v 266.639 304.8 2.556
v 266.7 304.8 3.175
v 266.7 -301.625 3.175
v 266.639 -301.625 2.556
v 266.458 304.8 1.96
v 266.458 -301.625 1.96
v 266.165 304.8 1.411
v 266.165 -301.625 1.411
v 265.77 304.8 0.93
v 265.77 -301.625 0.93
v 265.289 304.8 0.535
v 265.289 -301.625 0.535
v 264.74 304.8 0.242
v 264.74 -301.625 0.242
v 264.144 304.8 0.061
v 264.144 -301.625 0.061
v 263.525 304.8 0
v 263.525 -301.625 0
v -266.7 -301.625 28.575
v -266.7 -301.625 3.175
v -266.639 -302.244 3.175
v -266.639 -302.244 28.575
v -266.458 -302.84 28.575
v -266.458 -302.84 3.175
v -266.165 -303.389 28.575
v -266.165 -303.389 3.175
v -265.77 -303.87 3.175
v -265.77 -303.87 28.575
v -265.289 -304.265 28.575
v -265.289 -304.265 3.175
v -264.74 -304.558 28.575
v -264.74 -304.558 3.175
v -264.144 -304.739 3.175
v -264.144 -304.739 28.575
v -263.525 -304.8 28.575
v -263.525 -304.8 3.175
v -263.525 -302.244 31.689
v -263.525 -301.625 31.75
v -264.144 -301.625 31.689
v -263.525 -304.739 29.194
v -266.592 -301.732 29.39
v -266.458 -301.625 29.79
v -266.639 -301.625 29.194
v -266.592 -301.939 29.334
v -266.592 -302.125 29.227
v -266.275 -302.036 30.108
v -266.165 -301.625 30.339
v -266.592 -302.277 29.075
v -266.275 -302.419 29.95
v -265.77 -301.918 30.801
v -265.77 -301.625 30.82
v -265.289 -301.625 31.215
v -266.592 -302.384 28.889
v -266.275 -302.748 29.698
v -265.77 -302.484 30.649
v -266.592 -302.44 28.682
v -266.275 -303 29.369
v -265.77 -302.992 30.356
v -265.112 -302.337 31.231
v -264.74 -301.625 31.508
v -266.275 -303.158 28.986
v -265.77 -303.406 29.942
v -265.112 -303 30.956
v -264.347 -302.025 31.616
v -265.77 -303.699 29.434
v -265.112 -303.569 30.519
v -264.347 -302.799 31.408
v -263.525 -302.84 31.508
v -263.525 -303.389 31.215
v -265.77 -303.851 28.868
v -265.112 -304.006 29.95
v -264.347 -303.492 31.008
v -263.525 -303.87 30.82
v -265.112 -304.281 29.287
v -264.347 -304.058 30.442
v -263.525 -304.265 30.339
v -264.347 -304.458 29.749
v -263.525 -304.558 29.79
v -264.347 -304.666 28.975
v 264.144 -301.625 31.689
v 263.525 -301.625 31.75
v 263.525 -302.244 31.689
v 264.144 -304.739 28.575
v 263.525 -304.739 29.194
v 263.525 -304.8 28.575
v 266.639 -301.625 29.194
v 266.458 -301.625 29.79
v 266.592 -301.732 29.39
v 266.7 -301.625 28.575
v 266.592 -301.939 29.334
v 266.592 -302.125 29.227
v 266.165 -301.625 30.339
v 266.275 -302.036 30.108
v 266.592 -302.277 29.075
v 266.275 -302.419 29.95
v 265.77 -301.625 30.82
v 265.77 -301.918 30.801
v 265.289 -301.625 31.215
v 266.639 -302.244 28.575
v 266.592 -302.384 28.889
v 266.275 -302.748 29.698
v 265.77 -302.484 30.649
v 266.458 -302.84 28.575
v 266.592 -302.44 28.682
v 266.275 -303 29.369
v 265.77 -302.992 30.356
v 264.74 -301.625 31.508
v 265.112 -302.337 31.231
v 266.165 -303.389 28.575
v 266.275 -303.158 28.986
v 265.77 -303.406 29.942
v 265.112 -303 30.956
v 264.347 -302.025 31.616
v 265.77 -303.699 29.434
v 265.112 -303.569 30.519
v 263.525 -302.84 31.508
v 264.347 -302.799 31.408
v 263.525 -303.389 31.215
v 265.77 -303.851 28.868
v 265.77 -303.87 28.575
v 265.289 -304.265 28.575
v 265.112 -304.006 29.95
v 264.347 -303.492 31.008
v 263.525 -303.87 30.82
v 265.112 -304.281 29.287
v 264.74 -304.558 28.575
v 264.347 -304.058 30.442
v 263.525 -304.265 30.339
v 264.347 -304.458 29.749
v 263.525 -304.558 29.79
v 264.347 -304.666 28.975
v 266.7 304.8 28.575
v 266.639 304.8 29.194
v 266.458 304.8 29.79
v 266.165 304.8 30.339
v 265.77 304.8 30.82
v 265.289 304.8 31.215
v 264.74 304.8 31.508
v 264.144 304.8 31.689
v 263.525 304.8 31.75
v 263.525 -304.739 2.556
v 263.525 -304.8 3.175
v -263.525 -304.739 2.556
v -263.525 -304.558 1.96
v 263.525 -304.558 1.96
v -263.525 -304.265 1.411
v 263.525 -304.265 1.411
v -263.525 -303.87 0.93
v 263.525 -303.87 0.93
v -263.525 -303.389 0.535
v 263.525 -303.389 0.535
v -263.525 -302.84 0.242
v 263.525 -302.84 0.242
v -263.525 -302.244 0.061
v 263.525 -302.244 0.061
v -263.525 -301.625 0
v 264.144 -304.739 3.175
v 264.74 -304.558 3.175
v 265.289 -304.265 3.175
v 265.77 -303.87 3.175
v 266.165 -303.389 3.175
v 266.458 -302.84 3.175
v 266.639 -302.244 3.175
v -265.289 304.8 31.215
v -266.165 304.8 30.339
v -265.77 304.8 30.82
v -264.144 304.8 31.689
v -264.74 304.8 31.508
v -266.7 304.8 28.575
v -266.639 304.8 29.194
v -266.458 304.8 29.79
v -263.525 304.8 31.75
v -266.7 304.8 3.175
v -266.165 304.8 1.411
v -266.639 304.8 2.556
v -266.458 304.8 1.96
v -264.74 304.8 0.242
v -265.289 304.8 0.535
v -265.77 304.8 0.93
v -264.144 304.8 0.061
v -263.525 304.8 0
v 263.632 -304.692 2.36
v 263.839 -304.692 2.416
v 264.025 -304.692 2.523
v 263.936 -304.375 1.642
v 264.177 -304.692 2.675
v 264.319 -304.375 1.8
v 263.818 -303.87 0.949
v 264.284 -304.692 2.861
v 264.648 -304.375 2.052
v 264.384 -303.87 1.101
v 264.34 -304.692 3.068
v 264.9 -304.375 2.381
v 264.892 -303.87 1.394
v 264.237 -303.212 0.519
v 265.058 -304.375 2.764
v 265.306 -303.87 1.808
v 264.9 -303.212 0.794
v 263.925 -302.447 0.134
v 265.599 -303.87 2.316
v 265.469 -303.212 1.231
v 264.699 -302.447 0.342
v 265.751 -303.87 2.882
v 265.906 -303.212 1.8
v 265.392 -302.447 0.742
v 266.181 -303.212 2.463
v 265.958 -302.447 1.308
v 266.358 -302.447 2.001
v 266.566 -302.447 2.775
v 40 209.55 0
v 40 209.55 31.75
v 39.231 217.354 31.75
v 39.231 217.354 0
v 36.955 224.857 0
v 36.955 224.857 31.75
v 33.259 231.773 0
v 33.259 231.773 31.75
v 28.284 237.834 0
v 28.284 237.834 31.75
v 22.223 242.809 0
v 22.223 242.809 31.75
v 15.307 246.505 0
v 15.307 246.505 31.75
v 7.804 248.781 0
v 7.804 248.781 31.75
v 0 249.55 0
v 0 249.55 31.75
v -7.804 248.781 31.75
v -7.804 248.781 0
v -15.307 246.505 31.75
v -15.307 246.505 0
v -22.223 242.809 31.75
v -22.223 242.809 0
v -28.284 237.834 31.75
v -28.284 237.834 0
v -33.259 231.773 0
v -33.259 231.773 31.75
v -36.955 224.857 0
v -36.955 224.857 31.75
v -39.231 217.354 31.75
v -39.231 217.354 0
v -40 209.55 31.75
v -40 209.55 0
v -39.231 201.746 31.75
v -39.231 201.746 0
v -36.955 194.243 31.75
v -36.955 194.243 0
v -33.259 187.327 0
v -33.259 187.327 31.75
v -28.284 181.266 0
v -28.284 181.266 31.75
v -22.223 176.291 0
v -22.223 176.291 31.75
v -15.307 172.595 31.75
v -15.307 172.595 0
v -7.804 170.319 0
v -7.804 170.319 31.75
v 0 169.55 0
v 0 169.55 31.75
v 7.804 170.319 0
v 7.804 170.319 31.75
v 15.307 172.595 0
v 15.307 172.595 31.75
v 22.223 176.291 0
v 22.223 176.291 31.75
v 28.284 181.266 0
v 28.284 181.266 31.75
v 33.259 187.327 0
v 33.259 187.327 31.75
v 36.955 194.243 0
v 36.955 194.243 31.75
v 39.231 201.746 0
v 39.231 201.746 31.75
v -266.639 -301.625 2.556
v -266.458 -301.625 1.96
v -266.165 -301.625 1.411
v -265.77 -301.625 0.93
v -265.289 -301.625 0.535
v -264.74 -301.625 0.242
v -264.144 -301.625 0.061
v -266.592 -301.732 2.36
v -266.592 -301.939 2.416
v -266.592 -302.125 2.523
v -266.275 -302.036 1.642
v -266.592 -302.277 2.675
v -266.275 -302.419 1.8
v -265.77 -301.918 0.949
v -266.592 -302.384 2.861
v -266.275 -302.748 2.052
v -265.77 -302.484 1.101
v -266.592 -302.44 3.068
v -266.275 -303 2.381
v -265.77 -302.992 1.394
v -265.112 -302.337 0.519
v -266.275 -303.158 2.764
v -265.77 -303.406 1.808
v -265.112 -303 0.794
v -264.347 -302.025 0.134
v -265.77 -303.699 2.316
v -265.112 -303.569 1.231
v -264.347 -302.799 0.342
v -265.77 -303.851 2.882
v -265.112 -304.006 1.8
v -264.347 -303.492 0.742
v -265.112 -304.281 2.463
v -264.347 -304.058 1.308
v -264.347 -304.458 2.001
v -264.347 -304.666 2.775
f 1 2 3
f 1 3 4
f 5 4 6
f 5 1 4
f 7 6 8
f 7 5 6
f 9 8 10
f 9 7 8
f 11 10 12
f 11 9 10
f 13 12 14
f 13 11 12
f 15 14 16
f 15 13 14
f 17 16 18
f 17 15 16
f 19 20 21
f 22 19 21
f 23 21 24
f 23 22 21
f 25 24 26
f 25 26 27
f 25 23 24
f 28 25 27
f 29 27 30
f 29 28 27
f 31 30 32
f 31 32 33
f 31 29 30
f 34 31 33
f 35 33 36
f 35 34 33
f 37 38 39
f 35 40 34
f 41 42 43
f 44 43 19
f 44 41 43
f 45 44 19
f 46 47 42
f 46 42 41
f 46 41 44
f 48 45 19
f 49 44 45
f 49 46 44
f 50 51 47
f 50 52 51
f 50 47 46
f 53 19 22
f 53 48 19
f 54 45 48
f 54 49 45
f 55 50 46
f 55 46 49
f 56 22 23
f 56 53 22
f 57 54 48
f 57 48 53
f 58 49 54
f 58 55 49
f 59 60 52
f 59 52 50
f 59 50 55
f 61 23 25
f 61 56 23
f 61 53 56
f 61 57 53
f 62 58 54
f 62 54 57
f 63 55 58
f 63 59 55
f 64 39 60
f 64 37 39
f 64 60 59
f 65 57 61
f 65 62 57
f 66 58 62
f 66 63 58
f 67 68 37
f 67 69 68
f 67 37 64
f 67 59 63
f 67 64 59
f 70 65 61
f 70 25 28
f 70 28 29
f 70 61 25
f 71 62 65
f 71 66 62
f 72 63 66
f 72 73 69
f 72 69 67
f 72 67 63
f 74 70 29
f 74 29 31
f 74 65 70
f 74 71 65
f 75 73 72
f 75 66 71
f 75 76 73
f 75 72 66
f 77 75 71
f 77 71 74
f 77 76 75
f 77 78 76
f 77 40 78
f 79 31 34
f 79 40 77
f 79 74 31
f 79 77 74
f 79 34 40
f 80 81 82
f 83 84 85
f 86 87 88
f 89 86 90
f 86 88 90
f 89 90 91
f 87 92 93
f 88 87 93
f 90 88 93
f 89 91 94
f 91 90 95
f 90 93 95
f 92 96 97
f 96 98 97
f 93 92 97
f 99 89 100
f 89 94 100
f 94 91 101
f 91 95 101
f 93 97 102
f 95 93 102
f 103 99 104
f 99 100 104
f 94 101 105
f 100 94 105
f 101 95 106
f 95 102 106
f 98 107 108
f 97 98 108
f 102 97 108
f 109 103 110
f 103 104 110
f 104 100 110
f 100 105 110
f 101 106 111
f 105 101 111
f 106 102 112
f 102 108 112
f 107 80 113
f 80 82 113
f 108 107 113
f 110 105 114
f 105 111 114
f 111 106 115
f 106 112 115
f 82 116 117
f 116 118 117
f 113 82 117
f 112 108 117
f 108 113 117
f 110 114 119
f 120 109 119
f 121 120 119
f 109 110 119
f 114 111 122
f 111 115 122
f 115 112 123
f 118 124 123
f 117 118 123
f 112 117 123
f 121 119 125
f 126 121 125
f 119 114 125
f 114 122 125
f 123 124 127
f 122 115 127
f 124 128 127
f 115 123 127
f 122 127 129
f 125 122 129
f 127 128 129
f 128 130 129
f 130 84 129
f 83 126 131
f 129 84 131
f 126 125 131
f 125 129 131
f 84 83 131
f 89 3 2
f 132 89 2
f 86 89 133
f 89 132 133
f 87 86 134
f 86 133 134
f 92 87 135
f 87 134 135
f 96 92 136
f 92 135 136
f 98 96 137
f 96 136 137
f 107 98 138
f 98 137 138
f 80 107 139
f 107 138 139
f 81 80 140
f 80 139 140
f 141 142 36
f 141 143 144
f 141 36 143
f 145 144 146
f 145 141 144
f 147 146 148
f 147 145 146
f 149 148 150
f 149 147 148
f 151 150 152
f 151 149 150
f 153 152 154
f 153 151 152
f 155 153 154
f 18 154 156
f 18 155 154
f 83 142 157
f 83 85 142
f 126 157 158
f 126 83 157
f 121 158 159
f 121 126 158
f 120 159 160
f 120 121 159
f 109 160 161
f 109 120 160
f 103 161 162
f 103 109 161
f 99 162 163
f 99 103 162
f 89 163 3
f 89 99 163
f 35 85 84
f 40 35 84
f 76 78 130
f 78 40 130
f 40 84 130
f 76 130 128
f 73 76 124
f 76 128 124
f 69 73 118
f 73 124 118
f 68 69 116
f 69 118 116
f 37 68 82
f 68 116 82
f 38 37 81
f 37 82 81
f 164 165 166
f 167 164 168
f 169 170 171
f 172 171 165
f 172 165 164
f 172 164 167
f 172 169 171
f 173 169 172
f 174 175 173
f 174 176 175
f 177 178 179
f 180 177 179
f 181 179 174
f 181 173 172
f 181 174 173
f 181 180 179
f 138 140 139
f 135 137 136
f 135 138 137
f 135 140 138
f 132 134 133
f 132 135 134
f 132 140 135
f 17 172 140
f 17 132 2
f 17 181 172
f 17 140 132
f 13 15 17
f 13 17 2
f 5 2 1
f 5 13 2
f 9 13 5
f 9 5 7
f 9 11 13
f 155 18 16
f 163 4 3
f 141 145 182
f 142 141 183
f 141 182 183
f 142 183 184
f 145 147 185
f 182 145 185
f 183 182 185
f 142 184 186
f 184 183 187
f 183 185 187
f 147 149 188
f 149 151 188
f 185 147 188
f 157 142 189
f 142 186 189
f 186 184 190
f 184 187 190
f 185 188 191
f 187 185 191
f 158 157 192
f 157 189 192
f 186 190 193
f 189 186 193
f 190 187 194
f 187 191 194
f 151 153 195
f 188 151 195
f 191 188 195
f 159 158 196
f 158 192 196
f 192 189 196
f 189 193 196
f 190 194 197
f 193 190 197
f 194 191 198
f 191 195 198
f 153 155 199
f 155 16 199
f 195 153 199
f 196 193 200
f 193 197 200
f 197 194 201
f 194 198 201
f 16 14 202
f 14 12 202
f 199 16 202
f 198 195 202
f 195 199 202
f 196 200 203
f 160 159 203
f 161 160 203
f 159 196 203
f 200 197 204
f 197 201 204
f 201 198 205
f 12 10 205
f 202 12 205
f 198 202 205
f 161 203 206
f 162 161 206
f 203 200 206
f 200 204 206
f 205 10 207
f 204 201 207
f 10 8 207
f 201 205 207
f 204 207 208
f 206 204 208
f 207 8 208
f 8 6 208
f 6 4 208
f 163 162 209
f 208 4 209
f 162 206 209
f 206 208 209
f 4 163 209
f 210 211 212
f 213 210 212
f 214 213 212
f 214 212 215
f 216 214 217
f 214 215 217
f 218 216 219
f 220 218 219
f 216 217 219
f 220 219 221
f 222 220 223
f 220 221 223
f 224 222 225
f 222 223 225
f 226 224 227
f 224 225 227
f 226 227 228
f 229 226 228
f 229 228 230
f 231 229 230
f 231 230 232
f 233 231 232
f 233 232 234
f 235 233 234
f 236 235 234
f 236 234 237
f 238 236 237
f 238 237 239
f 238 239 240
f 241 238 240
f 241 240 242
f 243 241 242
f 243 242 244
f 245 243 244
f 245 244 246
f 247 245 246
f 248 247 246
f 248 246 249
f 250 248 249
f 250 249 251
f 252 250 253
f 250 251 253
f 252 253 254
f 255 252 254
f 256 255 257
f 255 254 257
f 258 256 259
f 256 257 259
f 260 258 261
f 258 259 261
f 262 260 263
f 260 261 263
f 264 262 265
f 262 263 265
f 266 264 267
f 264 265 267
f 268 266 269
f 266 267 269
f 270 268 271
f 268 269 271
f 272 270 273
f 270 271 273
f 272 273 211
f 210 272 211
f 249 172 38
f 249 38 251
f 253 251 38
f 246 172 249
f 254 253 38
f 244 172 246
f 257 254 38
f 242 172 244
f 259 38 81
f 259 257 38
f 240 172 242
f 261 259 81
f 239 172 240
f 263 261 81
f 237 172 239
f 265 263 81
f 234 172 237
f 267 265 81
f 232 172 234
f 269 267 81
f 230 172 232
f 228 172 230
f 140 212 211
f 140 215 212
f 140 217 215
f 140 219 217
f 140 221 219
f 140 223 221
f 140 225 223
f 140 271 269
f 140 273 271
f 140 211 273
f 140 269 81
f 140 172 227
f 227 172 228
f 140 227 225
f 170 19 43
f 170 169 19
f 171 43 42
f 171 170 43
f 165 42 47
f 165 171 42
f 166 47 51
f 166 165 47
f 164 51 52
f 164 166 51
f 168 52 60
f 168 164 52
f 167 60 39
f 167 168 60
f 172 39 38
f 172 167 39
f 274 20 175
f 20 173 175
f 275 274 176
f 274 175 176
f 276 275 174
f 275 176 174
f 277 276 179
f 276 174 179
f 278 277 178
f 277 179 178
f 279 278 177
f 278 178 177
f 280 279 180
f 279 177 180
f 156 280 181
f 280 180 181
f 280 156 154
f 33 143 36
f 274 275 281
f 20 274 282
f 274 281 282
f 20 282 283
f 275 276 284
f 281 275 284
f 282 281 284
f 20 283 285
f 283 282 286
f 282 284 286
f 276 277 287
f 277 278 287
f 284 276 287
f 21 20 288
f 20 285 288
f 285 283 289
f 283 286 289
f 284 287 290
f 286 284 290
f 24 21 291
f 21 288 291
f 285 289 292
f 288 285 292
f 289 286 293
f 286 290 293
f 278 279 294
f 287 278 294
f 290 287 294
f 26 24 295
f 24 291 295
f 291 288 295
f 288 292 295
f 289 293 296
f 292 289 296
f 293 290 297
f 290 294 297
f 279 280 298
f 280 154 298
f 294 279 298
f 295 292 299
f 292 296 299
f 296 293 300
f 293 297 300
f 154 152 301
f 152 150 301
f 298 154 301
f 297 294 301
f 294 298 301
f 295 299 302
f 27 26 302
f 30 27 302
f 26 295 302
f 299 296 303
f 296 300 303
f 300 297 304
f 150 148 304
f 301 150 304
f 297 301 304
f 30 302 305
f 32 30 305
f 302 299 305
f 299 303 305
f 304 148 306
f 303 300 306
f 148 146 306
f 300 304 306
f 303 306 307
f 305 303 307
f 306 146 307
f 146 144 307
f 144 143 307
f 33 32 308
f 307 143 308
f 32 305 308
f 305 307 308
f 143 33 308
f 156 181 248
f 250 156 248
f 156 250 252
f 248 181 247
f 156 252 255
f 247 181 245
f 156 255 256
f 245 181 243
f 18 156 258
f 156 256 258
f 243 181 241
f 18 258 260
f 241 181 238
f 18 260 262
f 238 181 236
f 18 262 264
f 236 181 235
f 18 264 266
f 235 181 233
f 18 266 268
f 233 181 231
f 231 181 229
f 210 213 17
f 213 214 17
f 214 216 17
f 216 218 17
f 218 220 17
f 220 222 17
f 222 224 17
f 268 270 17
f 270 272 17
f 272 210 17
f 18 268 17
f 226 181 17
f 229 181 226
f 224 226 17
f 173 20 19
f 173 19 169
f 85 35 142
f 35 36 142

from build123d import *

# Parameters (mm, degrees)
F0_W     = 533.4
F0_H     = 609.6
F1_DEPTH = 31.75
F2_R     = 3.175
F3_R     = 40
F4_DEPTH = 31.751


with BuildPart() as f1:
    # F0 (on Top) → F1 (new body)
    with BuildSketch(Plane.XY):
        Rectangle(F0_W, F0_H)
    extrude(amount=F1_DEPTH)

    # F2
    f2_edges = [f1.edges().sort_by_distance(p)[0] for p in [
        (0, -304.8, 31.75),
        (-266.7, 0, 31.75),
        (266.7, 0, 31.75),
        (266.7, 0, 0),
        (0, -304.8, 0),
        (-266.7, 0, 0),
        (-266.7, -304.8, 15.875),
        (266.7, -304.8, 15.875),
    ]]
    fillet(f2_edges, radius=F2_R)

    # F3 (on face) → F4 (cut, through all)
    with BuildSketch(Plane.XY.offset(31.75)):
        with Locations((0, 209.55)):
            Circle(F3_R)
    extrude(amount=-F4_DEPTH, mode=Mode.SUBTRACT)


solid = f1.part
